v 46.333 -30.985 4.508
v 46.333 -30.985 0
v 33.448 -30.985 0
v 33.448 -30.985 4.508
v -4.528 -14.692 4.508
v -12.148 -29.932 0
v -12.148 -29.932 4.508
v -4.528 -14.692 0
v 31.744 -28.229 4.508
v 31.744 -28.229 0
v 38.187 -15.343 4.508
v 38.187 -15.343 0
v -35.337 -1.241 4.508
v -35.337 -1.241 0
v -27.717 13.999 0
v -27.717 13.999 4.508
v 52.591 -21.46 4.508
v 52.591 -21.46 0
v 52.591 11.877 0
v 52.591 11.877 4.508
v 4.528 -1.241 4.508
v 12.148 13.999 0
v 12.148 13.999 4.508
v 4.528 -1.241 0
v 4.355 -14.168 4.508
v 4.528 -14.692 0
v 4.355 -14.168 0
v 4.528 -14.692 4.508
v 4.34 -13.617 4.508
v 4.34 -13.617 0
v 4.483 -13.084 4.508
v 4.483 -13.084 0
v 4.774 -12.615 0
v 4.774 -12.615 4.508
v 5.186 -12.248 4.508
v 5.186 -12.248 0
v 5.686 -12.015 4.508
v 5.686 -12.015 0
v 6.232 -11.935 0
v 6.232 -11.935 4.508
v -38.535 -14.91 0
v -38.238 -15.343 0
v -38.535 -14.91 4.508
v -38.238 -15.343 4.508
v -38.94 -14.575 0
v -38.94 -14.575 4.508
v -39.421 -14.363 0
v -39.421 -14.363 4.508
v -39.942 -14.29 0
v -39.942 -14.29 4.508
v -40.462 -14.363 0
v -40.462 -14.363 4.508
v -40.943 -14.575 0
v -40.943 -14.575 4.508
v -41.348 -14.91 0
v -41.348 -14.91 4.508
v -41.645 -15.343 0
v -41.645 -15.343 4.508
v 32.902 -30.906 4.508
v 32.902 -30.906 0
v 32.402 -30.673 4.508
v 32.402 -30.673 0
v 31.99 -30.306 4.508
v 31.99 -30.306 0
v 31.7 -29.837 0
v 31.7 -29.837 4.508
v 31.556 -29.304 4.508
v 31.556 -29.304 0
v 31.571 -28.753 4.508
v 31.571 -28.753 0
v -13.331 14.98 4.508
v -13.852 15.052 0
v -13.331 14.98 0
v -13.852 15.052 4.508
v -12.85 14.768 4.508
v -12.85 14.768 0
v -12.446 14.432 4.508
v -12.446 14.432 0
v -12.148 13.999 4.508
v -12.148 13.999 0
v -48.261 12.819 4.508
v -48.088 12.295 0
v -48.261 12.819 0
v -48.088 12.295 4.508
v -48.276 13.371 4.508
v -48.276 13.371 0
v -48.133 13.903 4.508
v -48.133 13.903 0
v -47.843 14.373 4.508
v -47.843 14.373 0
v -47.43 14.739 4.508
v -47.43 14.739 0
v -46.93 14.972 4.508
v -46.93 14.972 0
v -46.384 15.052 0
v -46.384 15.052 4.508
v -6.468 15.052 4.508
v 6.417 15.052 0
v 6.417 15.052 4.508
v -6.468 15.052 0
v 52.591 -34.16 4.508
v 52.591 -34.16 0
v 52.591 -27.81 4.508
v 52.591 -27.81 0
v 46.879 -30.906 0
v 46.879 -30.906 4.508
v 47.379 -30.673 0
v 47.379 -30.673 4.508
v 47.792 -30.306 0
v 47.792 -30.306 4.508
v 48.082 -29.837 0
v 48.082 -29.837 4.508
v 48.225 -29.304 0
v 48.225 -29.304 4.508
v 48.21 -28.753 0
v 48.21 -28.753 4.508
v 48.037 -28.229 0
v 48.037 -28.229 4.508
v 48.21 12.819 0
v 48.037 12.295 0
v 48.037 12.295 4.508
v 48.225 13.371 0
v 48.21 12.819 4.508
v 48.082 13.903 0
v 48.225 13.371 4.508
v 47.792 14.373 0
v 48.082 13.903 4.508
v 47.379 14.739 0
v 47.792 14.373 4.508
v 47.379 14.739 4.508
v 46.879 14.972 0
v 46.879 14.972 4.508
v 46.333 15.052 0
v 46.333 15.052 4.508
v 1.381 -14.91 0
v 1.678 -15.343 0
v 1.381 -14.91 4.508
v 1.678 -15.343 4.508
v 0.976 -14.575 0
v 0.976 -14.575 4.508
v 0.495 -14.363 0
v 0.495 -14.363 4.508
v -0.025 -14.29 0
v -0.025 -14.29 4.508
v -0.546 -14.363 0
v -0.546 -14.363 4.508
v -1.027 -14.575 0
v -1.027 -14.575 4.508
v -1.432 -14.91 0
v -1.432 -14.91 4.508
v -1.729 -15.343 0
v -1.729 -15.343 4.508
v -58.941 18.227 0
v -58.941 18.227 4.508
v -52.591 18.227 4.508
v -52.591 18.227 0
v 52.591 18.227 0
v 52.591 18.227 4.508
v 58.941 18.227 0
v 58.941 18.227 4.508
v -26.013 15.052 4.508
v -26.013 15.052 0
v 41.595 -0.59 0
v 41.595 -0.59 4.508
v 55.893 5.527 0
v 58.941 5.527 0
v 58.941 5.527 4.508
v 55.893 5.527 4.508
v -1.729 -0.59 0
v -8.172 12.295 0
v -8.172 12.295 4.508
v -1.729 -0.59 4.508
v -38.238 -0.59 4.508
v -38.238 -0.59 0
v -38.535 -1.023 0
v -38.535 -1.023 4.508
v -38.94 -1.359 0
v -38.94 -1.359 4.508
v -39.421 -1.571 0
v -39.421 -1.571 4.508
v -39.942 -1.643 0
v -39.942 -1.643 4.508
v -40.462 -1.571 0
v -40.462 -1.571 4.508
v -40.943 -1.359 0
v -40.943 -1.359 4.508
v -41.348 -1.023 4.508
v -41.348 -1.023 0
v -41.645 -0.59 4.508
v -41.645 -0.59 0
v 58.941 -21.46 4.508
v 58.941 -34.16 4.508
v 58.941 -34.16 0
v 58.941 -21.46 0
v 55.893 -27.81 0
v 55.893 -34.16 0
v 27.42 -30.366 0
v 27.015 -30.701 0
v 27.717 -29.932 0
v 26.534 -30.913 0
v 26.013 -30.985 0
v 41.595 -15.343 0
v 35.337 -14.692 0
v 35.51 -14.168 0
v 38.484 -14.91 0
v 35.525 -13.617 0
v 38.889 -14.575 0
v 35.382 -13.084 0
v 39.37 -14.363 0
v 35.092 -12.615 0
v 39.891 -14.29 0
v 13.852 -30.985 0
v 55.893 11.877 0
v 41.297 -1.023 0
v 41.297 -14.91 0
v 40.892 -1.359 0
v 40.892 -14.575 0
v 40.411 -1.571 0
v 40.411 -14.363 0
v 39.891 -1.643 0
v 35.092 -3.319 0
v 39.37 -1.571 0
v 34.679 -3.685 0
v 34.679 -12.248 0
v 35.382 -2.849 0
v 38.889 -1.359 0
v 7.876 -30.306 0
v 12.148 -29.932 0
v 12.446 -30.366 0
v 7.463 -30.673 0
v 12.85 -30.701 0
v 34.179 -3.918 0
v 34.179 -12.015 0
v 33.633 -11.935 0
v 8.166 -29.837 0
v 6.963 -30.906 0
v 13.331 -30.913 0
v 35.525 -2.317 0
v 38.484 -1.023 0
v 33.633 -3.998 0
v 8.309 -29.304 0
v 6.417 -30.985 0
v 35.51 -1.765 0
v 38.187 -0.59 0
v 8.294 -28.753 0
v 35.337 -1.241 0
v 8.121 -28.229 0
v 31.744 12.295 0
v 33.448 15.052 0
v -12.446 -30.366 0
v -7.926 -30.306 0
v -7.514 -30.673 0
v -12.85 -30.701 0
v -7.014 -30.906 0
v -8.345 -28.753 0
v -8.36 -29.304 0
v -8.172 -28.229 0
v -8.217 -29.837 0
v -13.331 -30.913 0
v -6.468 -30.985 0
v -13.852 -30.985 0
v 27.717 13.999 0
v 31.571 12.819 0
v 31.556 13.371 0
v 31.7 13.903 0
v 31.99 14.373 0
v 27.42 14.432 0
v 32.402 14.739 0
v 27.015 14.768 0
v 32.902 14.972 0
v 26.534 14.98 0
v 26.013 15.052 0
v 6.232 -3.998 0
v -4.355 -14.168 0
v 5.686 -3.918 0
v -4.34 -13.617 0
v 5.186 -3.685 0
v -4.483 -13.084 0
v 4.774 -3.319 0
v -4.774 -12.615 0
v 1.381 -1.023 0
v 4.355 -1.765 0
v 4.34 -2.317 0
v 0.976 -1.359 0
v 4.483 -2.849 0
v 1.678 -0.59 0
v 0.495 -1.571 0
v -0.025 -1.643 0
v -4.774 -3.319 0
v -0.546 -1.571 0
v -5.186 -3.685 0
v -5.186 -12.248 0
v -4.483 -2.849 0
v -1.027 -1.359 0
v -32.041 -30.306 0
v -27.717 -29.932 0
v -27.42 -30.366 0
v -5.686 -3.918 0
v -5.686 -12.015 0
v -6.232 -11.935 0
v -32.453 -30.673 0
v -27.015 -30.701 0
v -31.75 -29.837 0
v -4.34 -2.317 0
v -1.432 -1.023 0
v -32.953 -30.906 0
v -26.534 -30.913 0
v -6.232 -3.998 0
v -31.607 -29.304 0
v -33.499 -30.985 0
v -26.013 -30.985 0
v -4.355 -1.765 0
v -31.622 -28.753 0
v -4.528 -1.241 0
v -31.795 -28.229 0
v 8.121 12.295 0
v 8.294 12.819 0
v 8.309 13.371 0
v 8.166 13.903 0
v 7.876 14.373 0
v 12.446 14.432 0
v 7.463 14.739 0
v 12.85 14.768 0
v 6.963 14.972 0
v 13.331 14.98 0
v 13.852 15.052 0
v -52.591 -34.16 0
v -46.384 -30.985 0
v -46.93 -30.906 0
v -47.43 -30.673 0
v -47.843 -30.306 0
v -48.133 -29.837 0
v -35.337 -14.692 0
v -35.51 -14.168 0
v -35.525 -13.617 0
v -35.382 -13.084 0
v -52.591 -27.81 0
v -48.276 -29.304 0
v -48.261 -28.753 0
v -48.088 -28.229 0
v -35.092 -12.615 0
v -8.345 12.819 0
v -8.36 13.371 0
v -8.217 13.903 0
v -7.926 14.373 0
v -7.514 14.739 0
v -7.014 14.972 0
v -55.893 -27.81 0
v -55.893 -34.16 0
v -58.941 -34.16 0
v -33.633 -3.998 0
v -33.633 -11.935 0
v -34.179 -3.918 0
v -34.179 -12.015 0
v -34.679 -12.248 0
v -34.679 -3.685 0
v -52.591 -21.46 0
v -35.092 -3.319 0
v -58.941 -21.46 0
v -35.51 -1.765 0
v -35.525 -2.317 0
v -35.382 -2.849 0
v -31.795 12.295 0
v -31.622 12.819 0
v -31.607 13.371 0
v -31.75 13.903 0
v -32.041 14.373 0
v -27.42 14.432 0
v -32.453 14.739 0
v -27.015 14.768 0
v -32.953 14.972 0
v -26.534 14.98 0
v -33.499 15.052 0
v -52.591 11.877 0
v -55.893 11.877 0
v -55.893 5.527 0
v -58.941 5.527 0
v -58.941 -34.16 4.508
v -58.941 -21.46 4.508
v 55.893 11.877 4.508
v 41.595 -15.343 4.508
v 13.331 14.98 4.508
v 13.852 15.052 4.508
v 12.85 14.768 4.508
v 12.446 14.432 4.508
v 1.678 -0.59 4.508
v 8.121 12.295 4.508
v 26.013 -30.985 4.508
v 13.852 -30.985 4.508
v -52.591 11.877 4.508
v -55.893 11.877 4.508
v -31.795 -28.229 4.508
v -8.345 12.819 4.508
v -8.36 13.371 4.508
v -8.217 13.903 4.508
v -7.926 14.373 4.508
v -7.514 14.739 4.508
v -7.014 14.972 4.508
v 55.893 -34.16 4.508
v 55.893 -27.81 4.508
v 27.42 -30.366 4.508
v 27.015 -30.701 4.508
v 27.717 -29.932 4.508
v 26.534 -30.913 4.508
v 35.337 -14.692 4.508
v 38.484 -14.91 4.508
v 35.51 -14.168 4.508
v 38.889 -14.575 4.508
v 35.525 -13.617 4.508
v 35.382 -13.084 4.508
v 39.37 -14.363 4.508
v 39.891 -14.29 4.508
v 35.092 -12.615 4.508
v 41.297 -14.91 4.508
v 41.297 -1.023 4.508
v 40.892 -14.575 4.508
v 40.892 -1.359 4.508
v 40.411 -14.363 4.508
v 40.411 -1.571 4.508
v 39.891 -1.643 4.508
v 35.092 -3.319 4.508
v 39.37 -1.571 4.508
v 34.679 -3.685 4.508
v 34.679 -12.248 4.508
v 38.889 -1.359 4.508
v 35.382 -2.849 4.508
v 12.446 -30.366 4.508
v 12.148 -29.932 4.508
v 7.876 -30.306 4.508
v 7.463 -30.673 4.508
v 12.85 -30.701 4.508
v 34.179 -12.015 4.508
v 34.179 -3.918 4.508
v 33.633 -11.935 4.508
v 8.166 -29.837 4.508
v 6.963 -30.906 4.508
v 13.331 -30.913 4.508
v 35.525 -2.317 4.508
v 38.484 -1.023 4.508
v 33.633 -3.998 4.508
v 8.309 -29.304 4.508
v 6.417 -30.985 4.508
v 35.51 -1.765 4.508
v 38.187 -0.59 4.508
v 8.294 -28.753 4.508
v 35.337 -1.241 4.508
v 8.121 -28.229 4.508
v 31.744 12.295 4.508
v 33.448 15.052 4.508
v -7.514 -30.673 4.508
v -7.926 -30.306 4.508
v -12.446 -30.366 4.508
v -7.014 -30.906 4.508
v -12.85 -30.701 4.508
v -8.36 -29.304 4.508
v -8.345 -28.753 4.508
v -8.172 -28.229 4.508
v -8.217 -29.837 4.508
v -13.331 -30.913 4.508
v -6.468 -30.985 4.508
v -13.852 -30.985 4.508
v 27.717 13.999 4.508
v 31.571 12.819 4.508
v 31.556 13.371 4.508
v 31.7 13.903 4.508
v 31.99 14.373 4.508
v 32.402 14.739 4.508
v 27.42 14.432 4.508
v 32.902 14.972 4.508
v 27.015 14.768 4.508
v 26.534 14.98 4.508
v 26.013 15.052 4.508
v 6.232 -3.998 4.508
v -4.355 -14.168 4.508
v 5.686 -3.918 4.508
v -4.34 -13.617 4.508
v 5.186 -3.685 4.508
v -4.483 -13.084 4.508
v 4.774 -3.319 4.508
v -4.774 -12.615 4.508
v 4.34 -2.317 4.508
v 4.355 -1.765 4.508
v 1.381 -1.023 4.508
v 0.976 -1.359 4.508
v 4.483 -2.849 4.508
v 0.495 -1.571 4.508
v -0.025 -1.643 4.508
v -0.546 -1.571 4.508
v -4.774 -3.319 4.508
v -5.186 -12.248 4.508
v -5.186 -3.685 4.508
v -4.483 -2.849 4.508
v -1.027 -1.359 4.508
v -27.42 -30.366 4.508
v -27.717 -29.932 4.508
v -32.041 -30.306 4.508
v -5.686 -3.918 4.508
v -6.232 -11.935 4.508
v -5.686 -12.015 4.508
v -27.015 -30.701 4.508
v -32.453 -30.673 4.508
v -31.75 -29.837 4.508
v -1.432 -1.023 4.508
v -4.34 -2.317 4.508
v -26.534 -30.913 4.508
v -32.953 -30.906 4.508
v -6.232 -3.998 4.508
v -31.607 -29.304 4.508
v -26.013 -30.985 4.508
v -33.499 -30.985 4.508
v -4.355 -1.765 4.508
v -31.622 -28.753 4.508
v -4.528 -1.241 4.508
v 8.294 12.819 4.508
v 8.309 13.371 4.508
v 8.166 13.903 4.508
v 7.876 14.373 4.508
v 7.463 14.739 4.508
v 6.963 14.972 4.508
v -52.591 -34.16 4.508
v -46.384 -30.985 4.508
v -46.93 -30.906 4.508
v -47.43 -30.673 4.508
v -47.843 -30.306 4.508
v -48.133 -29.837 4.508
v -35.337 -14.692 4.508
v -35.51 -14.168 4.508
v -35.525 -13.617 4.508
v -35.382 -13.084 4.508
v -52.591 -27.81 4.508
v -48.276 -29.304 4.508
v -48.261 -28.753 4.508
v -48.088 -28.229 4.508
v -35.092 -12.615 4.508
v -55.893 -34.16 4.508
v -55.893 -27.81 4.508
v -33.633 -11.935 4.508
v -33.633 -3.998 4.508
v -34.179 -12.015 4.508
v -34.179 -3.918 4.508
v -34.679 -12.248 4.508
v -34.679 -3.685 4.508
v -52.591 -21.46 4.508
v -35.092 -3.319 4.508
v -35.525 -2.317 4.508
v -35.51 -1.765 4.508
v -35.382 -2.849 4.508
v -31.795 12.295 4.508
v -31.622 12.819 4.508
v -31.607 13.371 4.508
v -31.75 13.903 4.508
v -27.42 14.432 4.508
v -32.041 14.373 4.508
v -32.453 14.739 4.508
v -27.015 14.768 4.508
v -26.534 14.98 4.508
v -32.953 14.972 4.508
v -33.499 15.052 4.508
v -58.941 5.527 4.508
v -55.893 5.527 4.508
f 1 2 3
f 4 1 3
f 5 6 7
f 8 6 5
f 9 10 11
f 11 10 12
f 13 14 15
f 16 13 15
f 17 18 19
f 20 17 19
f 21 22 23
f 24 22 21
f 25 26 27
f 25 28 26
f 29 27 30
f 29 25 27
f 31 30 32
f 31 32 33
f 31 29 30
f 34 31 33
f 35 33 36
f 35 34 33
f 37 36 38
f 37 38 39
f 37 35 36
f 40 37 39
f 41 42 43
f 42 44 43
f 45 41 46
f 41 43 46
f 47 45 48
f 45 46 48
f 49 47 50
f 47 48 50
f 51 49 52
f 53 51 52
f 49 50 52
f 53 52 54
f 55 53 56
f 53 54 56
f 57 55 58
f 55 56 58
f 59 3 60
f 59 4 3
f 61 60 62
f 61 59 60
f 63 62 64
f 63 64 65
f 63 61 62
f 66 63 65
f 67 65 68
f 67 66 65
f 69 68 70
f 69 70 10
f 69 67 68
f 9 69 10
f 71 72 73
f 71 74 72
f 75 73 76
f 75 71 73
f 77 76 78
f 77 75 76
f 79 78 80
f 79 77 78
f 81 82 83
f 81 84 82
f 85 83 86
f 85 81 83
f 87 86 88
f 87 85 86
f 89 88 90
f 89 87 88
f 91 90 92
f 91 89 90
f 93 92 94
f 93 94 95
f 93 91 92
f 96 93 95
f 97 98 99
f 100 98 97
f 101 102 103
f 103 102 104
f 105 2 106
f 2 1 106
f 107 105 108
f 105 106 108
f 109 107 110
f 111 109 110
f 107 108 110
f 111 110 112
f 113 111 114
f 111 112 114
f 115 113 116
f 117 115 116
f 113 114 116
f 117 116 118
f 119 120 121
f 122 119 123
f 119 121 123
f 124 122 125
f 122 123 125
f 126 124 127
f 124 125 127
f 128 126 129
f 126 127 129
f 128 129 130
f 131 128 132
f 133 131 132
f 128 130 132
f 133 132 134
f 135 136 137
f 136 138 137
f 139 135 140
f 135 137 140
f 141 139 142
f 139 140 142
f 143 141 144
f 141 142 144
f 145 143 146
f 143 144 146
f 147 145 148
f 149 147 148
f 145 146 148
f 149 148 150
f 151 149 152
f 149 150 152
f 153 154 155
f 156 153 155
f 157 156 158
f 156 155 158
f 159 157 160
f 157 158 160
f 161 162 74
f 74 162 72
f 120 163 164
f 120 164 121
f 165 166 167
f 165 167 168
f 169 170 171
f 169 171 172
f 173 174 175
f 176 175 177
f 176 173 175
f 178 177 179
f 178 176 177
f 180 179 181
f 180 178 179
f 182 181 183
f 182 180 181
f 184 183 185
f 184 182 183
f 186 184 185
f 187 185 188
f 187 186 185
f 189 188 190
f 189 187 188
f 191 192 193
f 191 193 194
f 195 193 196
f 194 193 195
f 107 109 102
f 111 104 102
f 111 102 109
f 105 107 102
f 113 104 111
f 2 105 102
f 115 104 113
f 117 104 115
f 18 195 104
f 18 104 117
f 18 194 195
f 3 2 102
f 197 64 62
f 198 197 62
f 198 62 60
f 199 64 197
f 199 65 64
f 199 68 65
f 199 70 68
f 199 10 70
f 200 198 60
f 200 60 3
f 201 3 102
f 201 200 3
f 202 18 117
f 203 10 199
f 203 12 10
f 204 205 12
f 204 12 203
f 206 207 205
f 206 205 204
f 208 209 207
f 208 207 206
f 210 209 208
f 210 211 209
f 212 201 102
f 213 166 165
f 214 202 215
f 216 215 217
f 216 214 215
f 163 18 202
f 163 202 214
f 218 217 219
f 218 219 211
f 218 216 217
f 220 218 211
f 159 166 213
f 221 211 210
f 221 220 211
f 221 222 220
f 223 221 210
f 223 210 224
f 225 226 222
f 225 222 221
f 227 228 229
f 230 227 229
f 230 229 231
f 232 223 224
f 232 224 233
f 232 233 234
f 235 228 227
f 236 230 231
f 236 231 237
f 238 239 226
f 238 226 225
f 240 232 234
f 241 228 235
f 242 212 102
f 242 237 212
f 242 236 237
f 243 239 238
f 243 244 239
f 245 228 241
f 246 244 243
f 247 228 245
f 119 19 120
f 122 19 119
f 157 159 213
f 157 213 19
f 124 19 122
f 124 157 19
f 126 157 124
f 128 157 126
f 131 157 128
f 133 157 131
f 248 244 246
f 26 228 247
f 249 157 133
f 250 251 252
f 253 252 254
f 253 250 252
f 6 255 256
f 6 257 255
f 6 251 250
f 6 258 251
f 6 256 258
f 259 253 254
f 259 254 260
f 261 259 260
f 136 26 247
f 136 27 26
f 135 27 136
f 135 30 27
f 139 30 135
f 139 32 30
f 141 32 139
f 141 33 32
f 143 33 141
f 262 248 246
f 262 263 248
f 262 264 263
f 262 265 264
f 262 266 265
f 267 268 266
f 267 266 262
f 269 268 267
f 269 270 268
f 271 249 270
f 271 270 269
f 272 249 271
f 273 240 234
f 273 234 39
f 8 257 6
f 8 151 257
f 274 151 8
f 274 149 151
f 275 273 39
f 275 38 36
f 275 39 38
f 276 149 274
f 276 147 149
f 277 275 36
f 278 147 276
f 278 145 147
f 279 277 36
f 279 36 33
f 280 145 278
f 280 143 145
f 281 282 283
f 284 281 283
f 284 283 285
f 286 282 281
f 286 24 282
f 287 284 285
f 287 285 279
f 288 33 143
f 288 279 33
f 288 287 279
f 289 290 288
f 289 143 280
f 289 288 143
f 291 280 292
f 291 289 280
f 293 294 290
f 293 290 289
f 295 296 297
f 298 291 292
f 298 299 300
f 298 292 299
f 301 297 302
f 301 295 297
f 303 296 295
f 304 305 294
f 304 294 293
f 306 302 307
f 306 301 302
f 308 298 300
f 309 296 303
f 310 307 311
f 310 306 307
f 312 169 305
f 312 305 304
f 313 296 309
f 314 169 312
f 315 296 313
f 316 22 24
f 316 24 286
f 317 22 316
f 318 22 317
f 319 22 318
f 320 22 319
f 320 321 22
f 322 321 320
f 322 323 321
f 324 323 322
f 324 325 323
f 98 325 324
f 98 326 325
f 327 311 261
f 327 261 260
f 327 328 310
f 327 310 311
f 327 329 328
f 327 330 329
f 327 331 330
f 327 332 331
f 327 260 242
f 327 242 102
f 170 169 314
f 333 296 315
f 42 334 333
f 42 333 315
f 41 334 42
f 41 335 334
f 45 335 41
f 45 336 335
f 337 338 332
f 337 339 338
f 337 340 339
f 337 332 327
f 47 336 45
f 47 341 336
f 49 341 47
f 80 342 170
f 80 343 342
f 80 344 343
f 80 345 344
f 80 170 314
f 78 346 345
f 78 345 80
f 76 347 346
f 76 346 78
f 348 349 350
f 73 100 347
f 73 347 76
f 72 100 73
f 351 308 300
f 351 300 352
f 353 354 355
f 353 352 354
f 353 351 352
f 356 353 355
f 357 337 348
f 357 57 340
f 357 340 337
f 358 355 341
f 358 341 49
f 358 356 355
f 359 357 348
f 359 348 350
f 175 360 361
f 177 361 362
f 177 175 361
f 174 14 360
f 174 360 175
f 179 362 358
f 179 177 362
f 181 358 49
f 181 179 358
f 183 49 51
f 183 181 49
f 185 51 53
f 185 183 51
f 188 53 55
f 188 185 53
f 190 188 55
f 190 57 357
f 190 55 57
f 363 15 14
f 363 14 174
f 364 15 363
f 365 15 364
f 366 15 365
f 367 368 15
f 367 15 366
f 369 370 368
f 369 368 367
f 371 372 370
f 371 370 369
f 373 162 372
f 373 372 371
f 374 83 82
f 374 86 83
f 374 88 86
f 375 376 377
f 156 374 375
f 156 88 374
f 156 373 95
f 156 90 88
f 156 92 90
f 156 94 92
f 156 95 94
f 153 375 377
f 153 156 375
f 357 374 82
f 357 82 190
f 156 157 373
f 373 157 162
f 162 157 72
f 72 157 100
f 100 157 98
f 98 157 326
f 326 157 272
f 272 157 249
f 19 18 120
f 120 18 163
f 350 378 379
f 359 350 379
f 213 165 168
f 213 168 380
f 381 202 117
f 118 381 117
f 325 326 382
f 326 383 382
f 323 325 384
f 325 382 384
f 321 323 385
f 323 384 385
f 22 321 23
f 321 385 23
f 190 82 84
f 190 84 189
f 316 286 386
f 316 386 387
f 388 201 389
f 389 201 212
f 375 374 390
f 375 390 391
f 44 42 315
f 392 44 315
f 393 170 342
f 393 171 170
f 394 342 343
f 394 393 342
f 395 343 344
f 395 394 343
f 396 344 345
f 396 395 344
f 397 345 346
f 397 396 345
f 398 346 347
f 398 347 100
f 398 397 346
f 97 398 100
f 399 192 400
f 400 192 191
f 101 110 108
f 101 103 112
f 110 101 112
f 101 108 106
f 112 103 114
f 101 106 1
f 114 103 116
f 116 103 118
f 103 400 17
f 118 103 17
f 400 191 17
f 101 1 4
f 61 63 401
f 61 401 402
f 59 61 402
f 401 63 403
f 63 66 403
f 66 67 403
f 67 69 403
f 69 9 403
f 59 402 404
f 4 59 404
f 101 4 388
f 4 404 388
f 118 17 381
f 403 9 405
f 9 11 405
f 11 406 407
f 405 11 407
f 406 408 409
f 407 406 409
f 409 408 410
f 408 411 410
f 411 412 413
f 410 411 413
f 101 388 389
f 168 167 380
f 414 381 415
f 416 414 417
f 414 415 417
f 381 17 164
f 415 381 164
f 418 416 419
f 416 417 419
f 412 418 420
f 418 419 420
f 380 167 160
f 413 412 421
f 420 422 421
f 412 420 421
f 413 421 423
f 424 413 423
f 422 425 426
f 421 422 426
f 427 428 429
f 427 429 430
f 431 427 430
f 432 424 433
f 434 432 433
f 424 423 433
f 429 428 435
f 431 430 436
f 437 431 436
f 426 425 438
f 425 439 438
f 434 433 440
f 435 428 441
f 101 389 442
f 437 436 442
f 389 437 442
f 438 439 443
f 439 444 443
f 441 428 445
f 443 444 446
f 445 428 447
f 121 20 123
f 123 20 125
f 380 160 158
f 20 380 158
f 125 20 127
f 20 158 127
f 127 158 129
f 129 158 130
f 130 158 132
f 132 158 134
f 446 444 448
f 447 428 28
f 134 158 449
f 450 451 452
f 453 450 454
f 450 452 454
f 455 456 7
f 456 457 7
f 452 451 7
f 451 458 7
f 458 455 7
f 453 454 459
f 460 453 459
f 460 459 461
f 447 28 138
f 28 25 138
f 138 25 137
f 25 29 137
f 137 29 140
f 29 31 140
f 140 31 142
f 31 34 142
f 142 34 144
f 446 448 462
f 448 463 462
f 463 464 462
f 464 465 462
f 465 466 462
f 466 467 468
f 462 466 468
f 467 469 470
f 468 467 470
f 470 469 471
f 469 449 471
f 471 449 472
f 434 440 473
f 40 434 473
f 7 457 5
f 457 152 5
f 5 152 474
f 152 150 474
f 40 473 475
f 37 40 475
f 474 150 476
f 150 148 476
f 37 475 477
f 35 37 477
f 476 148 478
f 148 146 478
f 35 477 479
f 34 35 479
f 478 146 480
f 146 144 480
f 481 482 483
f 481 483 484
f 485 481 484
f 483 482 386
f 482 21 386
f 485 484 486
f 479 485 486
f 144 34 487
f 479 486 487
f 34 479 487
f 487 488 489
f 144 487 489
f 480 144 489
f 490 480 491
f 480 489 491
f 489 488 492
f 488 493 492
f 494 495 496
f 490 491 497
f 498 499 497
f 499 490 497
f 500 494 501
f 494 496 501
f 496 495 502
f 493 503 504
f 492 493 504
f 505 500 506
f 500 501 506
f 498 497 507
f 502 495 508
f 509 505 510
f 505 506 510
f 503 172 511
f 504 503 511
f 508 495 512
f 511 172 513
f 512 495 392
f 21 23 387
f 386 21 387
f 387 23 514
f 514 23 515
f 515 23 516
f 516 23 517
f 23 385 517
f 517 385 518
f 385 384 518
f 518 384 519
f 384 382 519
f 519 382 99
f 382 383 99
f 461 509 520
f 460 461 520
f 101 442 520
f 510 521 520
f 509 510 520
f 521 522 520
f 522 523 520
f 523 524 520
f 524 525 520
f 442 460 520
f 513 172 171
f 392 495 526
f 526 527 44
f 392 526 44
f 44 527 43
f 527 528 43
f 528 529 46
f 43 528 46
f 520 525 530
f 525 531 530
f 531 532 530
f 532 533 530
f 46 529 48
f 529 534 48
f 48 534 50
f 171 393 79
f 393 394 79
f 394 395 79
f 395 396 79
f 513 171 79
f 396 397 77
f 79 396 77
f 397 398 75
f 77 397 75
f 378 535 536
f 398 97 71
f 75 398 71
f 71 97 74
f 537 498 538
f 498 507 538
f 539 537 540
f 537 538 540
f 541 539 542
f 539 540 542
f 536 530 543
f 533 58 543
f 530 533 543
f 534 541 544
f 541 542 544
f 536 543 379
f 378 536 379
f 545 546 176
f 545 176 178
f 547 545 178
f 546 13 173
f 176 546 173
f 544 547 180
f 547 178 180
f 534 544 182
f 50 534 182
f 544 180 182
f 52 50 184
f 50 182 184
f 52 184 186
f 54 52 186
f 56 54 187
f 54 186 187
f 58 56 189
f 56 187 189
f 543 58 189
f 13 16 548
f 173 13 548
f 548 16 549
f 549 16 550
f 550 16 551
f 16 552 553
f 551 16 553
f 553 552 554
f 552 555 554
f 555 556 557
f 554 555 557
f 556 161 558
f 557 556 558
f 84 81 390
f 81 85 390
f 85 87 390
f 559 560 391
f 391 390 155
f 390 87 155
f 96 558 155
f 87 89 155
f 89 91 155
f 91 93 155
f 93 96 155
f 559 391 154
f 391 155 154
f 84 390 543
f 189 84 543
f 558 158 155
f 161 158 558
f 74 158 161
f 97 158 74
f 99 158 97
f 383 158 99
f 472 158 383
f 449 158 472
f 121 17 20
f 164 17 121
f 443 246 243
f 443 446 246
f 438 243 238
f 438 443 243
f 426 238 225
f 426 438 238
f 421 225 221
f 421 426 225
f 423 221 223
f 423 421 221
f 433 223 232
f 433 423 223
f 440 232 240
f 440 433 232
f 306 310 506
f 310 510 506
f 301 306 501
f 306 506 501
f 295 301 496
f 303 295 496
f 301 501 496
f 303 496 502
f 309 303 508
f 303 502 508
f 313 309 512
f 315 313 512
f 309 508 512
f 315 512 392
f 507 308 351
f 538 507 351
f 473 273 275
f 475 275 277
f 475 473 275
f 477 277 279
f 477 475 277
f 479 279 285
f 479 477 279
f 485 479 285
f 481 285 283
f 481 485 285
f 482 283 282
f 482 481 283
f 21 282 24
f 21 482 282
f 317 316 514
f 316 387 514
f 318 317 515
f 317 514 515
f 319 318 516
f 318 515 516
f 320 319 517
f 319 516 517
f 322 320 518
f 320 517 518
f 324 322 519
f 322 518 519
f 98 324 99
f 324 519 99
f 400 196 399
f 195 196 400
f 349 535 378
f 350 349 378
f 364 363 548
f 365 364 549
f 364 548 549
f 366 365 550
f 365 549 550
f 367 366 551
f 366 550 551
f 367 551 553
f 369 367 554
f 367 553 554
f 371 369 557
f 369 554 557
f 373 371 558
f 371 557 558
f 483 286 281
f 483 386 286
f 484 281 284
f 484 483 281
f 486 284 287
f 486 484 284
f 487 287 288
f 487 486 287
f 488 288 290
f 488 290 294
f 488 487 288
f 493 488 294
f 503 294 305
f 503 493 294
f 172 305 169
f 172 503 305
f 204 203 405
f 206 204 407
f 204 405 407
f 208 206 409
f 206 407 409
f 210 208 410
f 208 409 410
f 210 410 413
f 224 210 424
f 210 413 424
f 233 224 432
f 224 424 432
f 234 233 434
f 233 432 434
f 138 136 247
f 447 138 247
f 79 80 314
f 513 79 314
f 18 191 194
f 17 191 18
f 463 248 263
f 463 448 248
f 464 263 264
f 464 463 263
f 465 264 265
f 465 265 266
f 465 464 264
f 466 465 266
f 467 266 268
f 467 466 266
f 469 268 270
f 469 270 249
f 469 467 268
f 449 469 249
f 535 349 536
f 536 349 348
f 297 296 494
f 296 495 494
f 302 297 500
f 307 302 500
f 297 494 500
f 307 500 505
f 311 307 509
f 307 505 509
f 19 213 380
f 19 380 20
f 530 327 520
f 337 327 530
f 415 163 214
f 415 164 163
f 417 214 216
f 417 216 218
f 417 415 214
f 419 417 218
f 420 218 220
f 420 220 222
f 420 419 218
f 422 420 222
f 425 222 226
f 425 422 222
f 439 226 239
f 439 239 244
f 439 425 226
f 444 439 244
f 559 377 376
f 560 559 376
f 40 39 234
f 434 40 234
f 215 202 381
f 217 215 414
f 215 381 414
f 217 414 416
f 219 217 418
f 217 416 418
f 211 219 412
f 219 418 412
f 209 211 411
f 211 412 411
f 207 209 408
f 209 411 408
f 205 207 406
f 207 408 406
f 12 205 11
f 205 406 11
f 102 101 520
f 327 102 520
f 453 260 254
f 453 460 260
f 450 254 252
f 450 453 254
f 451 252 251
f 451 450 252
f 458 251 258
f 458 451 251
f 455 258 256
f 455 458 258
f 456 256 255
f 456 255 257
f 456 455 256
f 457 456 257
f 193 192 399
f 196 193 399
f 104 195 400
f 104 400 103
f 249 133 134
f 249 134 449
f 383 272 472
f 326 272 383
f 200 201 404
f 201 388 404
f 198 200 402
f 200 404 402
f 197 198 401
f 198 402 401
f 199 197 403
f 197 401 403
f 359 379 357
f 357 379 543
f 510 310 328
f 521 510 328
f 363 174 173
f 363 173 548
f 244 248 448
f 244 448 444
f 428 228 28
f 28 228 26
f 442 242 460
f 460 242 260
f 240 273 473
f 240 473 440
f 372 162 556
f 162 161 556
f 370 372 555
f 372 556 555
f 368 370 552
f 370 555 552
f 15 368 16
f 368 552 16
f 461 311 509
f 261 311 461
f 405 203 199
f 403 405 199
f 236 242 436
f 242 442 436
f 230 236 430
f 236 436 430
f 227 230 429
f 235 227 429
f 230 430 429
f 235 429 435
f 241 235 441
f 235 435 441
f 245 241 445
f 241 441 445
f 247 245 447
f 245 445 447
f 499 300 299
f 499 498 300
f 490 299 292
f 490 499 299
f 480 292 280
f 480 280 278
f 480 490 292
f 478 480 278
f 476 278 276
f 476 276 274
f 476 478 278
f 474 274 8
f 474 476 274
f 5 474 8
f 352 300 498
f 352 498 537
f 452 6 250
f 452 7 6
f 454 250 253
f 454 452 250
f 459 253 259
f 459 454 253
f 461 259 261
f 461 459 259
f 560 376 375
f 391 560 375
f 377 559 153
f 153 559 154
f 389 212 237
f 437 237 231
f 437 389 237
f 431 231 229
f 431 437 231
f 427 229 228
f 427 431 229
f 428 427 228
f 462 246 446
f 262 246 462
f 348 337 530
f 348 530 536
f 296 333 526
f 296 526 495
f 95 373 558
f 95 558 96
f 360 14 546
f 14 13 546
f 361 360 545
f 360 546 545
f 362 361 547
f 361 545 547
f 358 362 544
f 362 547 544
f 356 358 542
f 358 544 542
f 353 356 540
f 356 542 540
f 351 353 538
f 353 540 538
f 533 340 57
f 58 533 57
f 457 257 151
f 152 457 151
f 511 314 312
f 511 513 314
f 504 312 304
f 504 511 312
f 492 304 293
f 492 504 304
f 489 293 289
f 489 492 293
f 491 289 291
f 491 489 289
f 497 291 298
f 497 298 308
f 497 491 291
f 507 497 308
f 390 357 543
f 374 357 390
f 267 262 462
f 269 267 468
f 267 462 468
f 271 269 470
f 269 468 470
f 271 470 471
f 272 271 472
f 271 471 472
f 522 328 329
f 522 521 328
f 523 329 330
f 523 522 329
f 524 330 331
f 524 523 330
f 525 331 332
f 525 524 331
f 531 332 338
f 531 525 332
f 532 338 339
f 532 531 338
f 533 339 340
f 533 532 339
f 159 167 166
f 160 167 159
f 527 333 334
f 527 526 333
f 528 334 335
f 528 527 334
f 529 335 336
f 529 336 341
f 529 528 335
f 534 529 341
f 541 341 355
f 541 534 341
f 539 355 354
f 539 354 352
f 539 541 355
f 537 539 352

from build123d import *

# Parameters (mm, degrees)
SKETCH1_W            = 105.1814
SKETCH1_H            = 68.320954018
BOSS_EXTRUDE1_DEPTH  = 4.5085
SKETCH2_W            = 105.1814
SKETCH2_H            = 15.933454036
CUT_EXTRUDE1_DEPTH   = 10.795
SKETCH3_W            = 6.35
SKETCH3_H            = 12.7
BOSS_EXTRUDE2_DEPTH  = 4.5085
CUT_EXTRUDE2_DEPTH   = 4.7625
LPATTERN1_COUNT      = 3
LPATTERN1_PITCH      = 39.916133528
CUT_EXTRUDE3_DEPTH   = 4.7625
FILLET2_R            = 1.905
MIRROR3_COPY_1_DEPTH = 4.7625
MIRROR3_COPY_2_DEPTH = 4.7625
MIRROR3_COPY_3_DEPTH = 4.7625
FILLET3_R            = 1.905
SKETCH6_W            = 3.302
SKETCH6_H            = 6.35
CUT_EXTRUDE4_DEPTH   = 6.35


with BuildPart() as part:
    # Sketch1 → Boss-Extrude1 (new body)
    with BuildSketch(Plane.XY):
        Rectangle(SKETCH1_W, SKETCH1_H)
    extrude(amount=BOSS_EXTRUDE1_DEPTH)

    # Sketch2 → Cut-Extrude1 (cut)
    with BuildSketch(Plane.XY.offset(4.5085)):
        with Locations((0, 26.193749991)):
            Rectangle(SKETCH2_W, SKETCH2_H)
    extrude(amount=-CUT_EXTRUDE1_DEPTH, mode=Mode.SUBTRACT)

    # Sketch3 → Boss-Extrude2 (add)
    with BuildSketch(Plane.XY.offset(4.5085)):
        with Locations((-55.7657, -27.810477009)):
            Rectangle(SKETCH3_W, SKETCH3_H)
        with Locations((-55.7657, 11.877022991)):
            Rectangle(SKETCH3_W, SKETCH3_H)
    boss_extrude2 = extrude(amount=-BOSS_EXTRUDE2_DEPTH)

    # Mirror1: Boss-Extrude2 across plane
    add(boss_extrude2.mirror(Plane(origin=(0, 0, 0), x_dir=(0, 0, 1), z_dir=(1, 0, 0))))

    # Sketch4 → Cut-Extrude2 (cut)
    with BuildSketch(Plane(origin=(0, 0, 0), x_dir=(-1, 0, 0), z_dir=(0, 0, -1))):
        Polygon((-49.4157, 15.052022991), (-30.3657, 15.052022991), (-39.8907, -3.997977009), align=None)
    cut_extrude2 = extrude(amount=-CUT_EXTRUDE2_DEPTH, mode=Mode.SUBTRACT)

    # LPattern1: Cut-Extrude2 ×3
    with Locations(*[(-i * LPATTERN1_PITCH, 0, 0) for i in range(1, LPATTERN1_COUNT)]):
        add(cut_extrude2, mode=Mode.SUBTRACT)

    # Sketch5 → Cut-Extrude3 (cut)
    with BuildSketch(Plane(origin=(0, 0, 0), x_dir=(-1, 0, 0), z_dir=(0, 0, -1))):
        Polygon((-27.1907, 15.052022991), (-12.674566472, 15.052022991), (-3.149566472, -3.997977009), (-36.7157, -3.997977009), align=None)
    cut_extrude3 = extrude(amount=-CUT_EXTRUDE3_DEPTH, mode=Mode.SUBTRACT)

    # Mirror2: Cut-Extrude3 across plane
    add(cut_extrude3.mirror(Plane(origin=(0, 0, 0), x_dir=(0, 0, 1), z_dir=(1, 0, 0))), mode=Mode.SUBTRACT)

    # Fillet2
    fillet2_edges = [part.edges().sort_by_distance(p)[0] for p in [
        (-0.025433528, -3.997977009, 2.25425),
        (9.499566472, 15.052022991, 2.25425),
        (-9.550433528, 15.052022991, 2.25425),
        (-30.416567056, 15.052022991, 2.25425),
        (-39.941567056, -3.997977009, 2.25425),
        (-49.466567056, 15.052022991, 2.25425),
        (39.8907, -3.997977009, 2.25425),
        (49.4157, 15.052022991, 2.25425),
        (30.3657, 15.052022991, 2.25425),
    ]]
    fillet(fillet2_edges, radius=FILLET2_R)

    # Mirror3: Cut-Extrude2, Cut-Extrude3 across plane
    add(cut_extrude2.mirror(Plane.ZX.offset(-7.966727018)), mode=Mode.SUBTRACT)
    add(cut_extrude3.mirror(Plane.ZX.offset(-7.966727018)), mode=Mode.SUBTRACT)

    # Mirror3 copy 1 sketch → Mirror3 copy 1 (cut)
    with BuildSketch(Plane(origin=(-39.916133528, -15.933454036, 0), x_dir=(-1, 0, 0), z_dir=(0, 0, -1))):
        Polygon((-49.4157, -15.052022991), (-30.3657, -15.052022991), (-39.8907, 3.997977009), align=None)
    extrude(amount=-MIRROR3_COPY_1_DEPTH, mode=Mode.SUBTRACT)

    # Mirror3 copy 2 sketch → Mirror3 copy 2 (cut)
    with BuildSketch(Plane(origin=(-79.832267056, -15.933454036, 0), x_dir=(-1, 0, 0), z_dir=(0, 0, -1))):
        Polygon((-49.4157, -15.052022991), (-30.3657, -15.052022991), (-39.8907, 3.997977009), align=None)
    extrude(amount=-MIRROR3_COPY_2_DEPTH, mode=Mode.SUBTRACT)

    # Mirror3 copy 3 sketch → Mirror3 copy 3 (cut)
    with BuildSketch(Plane(origin=(0, -15.933454036, 0), x_dir=(1, 0, 0), z_dir=(0, 0, -1))):
        Polygon((-27.1907, 15.052022991), (-12.674566472, 15.052022991), (-3.149566472, -3.997977009), (-36.7157, -3.997977009), align=None)
    extrude(amount=-MIRROR3_COPY_3_DEPTH, mode=Mode.SUBTRACT)

    # Fillet3
    fillet3_edges = [part.edges().sort_by_distance(p)[0] for p in [
        (36.7157, -3.997977009, 2.25425),
        (27.1907, 15.052022991, 2.25425),
        (12.674566472, 15.052022991, 2.25425),
        (3.149566472, -3.997977009, 2.25425),
        (-27.1907, 15.052022991, 2.25425),
        (-36.7157, -3.997977009, 2.25425),
        (-3.149566472, -3.997977009, 2.25425),
        (-12.674566472, 15.052022991, 2.25425),
        (49.4157, -30.985477027, 2.25425),
        (39.8907, -11.935477027, 2.25425),
        (30.3657, -30.985477027, 2.25425),
        (9.499566472, -30.985477027, 2.25425),
        (-0.025433528, -11.935477027, 2.25425),
        (-9.550433528, -30.985477027, 2.25425),
        (-30.416567056, -30.985477027, 2.25425),
        (-39.941567056, -11.935477027, 2.25425),
        (-49.466567056, -30.985477027, 2.25425),
        (-36.7157, -11.935477027, 2.25425),
        (-27.1907, -30.985477027, 2.25425),
        (-12.674566472, -30.985477027, 2.25425),
        (-3.149566472, -11.935477027, 2.25425),
        (27.1907, -30.985477027, 2.25425),
        (36.7157, -11.935477027, 2.25425),
        (3.149566472, -11.935477027, 2.25425),
        (12.674566472, -30.985477027, 2.25425),
    ]]
    fillet(fillet3_edges, radius=FILLET3_R)

    # Sketch6 → Cut-Extrude4 (cut)
    with BuildSketch(Plane(origin=(0, 0, 0), x_dir=(-1, 0, 0), z_dir=(0, 0, -1))):
        with Locations((-54.2417, 8.702022991)):
            Rectangle(SKETCH6_W, SKETCH6_H)
        with Locations((54.2417, 8.702022991)):
            Rectangle(SKETCH6_W, SKETCH6_H)
        with Locations((-54.2417, -30.985477009)):
            Rectangle(SKETCH6_W, SKETCH6_H)
        with Locations((54.2417, -30.985477009)):
            Rectangle(SKETCH6_W, SKETCH6_H)
    extrude(amount=-CUT_EXTRUDE4_DEPTH, mode=Mode.SUBTRACT)


solid = part.part
